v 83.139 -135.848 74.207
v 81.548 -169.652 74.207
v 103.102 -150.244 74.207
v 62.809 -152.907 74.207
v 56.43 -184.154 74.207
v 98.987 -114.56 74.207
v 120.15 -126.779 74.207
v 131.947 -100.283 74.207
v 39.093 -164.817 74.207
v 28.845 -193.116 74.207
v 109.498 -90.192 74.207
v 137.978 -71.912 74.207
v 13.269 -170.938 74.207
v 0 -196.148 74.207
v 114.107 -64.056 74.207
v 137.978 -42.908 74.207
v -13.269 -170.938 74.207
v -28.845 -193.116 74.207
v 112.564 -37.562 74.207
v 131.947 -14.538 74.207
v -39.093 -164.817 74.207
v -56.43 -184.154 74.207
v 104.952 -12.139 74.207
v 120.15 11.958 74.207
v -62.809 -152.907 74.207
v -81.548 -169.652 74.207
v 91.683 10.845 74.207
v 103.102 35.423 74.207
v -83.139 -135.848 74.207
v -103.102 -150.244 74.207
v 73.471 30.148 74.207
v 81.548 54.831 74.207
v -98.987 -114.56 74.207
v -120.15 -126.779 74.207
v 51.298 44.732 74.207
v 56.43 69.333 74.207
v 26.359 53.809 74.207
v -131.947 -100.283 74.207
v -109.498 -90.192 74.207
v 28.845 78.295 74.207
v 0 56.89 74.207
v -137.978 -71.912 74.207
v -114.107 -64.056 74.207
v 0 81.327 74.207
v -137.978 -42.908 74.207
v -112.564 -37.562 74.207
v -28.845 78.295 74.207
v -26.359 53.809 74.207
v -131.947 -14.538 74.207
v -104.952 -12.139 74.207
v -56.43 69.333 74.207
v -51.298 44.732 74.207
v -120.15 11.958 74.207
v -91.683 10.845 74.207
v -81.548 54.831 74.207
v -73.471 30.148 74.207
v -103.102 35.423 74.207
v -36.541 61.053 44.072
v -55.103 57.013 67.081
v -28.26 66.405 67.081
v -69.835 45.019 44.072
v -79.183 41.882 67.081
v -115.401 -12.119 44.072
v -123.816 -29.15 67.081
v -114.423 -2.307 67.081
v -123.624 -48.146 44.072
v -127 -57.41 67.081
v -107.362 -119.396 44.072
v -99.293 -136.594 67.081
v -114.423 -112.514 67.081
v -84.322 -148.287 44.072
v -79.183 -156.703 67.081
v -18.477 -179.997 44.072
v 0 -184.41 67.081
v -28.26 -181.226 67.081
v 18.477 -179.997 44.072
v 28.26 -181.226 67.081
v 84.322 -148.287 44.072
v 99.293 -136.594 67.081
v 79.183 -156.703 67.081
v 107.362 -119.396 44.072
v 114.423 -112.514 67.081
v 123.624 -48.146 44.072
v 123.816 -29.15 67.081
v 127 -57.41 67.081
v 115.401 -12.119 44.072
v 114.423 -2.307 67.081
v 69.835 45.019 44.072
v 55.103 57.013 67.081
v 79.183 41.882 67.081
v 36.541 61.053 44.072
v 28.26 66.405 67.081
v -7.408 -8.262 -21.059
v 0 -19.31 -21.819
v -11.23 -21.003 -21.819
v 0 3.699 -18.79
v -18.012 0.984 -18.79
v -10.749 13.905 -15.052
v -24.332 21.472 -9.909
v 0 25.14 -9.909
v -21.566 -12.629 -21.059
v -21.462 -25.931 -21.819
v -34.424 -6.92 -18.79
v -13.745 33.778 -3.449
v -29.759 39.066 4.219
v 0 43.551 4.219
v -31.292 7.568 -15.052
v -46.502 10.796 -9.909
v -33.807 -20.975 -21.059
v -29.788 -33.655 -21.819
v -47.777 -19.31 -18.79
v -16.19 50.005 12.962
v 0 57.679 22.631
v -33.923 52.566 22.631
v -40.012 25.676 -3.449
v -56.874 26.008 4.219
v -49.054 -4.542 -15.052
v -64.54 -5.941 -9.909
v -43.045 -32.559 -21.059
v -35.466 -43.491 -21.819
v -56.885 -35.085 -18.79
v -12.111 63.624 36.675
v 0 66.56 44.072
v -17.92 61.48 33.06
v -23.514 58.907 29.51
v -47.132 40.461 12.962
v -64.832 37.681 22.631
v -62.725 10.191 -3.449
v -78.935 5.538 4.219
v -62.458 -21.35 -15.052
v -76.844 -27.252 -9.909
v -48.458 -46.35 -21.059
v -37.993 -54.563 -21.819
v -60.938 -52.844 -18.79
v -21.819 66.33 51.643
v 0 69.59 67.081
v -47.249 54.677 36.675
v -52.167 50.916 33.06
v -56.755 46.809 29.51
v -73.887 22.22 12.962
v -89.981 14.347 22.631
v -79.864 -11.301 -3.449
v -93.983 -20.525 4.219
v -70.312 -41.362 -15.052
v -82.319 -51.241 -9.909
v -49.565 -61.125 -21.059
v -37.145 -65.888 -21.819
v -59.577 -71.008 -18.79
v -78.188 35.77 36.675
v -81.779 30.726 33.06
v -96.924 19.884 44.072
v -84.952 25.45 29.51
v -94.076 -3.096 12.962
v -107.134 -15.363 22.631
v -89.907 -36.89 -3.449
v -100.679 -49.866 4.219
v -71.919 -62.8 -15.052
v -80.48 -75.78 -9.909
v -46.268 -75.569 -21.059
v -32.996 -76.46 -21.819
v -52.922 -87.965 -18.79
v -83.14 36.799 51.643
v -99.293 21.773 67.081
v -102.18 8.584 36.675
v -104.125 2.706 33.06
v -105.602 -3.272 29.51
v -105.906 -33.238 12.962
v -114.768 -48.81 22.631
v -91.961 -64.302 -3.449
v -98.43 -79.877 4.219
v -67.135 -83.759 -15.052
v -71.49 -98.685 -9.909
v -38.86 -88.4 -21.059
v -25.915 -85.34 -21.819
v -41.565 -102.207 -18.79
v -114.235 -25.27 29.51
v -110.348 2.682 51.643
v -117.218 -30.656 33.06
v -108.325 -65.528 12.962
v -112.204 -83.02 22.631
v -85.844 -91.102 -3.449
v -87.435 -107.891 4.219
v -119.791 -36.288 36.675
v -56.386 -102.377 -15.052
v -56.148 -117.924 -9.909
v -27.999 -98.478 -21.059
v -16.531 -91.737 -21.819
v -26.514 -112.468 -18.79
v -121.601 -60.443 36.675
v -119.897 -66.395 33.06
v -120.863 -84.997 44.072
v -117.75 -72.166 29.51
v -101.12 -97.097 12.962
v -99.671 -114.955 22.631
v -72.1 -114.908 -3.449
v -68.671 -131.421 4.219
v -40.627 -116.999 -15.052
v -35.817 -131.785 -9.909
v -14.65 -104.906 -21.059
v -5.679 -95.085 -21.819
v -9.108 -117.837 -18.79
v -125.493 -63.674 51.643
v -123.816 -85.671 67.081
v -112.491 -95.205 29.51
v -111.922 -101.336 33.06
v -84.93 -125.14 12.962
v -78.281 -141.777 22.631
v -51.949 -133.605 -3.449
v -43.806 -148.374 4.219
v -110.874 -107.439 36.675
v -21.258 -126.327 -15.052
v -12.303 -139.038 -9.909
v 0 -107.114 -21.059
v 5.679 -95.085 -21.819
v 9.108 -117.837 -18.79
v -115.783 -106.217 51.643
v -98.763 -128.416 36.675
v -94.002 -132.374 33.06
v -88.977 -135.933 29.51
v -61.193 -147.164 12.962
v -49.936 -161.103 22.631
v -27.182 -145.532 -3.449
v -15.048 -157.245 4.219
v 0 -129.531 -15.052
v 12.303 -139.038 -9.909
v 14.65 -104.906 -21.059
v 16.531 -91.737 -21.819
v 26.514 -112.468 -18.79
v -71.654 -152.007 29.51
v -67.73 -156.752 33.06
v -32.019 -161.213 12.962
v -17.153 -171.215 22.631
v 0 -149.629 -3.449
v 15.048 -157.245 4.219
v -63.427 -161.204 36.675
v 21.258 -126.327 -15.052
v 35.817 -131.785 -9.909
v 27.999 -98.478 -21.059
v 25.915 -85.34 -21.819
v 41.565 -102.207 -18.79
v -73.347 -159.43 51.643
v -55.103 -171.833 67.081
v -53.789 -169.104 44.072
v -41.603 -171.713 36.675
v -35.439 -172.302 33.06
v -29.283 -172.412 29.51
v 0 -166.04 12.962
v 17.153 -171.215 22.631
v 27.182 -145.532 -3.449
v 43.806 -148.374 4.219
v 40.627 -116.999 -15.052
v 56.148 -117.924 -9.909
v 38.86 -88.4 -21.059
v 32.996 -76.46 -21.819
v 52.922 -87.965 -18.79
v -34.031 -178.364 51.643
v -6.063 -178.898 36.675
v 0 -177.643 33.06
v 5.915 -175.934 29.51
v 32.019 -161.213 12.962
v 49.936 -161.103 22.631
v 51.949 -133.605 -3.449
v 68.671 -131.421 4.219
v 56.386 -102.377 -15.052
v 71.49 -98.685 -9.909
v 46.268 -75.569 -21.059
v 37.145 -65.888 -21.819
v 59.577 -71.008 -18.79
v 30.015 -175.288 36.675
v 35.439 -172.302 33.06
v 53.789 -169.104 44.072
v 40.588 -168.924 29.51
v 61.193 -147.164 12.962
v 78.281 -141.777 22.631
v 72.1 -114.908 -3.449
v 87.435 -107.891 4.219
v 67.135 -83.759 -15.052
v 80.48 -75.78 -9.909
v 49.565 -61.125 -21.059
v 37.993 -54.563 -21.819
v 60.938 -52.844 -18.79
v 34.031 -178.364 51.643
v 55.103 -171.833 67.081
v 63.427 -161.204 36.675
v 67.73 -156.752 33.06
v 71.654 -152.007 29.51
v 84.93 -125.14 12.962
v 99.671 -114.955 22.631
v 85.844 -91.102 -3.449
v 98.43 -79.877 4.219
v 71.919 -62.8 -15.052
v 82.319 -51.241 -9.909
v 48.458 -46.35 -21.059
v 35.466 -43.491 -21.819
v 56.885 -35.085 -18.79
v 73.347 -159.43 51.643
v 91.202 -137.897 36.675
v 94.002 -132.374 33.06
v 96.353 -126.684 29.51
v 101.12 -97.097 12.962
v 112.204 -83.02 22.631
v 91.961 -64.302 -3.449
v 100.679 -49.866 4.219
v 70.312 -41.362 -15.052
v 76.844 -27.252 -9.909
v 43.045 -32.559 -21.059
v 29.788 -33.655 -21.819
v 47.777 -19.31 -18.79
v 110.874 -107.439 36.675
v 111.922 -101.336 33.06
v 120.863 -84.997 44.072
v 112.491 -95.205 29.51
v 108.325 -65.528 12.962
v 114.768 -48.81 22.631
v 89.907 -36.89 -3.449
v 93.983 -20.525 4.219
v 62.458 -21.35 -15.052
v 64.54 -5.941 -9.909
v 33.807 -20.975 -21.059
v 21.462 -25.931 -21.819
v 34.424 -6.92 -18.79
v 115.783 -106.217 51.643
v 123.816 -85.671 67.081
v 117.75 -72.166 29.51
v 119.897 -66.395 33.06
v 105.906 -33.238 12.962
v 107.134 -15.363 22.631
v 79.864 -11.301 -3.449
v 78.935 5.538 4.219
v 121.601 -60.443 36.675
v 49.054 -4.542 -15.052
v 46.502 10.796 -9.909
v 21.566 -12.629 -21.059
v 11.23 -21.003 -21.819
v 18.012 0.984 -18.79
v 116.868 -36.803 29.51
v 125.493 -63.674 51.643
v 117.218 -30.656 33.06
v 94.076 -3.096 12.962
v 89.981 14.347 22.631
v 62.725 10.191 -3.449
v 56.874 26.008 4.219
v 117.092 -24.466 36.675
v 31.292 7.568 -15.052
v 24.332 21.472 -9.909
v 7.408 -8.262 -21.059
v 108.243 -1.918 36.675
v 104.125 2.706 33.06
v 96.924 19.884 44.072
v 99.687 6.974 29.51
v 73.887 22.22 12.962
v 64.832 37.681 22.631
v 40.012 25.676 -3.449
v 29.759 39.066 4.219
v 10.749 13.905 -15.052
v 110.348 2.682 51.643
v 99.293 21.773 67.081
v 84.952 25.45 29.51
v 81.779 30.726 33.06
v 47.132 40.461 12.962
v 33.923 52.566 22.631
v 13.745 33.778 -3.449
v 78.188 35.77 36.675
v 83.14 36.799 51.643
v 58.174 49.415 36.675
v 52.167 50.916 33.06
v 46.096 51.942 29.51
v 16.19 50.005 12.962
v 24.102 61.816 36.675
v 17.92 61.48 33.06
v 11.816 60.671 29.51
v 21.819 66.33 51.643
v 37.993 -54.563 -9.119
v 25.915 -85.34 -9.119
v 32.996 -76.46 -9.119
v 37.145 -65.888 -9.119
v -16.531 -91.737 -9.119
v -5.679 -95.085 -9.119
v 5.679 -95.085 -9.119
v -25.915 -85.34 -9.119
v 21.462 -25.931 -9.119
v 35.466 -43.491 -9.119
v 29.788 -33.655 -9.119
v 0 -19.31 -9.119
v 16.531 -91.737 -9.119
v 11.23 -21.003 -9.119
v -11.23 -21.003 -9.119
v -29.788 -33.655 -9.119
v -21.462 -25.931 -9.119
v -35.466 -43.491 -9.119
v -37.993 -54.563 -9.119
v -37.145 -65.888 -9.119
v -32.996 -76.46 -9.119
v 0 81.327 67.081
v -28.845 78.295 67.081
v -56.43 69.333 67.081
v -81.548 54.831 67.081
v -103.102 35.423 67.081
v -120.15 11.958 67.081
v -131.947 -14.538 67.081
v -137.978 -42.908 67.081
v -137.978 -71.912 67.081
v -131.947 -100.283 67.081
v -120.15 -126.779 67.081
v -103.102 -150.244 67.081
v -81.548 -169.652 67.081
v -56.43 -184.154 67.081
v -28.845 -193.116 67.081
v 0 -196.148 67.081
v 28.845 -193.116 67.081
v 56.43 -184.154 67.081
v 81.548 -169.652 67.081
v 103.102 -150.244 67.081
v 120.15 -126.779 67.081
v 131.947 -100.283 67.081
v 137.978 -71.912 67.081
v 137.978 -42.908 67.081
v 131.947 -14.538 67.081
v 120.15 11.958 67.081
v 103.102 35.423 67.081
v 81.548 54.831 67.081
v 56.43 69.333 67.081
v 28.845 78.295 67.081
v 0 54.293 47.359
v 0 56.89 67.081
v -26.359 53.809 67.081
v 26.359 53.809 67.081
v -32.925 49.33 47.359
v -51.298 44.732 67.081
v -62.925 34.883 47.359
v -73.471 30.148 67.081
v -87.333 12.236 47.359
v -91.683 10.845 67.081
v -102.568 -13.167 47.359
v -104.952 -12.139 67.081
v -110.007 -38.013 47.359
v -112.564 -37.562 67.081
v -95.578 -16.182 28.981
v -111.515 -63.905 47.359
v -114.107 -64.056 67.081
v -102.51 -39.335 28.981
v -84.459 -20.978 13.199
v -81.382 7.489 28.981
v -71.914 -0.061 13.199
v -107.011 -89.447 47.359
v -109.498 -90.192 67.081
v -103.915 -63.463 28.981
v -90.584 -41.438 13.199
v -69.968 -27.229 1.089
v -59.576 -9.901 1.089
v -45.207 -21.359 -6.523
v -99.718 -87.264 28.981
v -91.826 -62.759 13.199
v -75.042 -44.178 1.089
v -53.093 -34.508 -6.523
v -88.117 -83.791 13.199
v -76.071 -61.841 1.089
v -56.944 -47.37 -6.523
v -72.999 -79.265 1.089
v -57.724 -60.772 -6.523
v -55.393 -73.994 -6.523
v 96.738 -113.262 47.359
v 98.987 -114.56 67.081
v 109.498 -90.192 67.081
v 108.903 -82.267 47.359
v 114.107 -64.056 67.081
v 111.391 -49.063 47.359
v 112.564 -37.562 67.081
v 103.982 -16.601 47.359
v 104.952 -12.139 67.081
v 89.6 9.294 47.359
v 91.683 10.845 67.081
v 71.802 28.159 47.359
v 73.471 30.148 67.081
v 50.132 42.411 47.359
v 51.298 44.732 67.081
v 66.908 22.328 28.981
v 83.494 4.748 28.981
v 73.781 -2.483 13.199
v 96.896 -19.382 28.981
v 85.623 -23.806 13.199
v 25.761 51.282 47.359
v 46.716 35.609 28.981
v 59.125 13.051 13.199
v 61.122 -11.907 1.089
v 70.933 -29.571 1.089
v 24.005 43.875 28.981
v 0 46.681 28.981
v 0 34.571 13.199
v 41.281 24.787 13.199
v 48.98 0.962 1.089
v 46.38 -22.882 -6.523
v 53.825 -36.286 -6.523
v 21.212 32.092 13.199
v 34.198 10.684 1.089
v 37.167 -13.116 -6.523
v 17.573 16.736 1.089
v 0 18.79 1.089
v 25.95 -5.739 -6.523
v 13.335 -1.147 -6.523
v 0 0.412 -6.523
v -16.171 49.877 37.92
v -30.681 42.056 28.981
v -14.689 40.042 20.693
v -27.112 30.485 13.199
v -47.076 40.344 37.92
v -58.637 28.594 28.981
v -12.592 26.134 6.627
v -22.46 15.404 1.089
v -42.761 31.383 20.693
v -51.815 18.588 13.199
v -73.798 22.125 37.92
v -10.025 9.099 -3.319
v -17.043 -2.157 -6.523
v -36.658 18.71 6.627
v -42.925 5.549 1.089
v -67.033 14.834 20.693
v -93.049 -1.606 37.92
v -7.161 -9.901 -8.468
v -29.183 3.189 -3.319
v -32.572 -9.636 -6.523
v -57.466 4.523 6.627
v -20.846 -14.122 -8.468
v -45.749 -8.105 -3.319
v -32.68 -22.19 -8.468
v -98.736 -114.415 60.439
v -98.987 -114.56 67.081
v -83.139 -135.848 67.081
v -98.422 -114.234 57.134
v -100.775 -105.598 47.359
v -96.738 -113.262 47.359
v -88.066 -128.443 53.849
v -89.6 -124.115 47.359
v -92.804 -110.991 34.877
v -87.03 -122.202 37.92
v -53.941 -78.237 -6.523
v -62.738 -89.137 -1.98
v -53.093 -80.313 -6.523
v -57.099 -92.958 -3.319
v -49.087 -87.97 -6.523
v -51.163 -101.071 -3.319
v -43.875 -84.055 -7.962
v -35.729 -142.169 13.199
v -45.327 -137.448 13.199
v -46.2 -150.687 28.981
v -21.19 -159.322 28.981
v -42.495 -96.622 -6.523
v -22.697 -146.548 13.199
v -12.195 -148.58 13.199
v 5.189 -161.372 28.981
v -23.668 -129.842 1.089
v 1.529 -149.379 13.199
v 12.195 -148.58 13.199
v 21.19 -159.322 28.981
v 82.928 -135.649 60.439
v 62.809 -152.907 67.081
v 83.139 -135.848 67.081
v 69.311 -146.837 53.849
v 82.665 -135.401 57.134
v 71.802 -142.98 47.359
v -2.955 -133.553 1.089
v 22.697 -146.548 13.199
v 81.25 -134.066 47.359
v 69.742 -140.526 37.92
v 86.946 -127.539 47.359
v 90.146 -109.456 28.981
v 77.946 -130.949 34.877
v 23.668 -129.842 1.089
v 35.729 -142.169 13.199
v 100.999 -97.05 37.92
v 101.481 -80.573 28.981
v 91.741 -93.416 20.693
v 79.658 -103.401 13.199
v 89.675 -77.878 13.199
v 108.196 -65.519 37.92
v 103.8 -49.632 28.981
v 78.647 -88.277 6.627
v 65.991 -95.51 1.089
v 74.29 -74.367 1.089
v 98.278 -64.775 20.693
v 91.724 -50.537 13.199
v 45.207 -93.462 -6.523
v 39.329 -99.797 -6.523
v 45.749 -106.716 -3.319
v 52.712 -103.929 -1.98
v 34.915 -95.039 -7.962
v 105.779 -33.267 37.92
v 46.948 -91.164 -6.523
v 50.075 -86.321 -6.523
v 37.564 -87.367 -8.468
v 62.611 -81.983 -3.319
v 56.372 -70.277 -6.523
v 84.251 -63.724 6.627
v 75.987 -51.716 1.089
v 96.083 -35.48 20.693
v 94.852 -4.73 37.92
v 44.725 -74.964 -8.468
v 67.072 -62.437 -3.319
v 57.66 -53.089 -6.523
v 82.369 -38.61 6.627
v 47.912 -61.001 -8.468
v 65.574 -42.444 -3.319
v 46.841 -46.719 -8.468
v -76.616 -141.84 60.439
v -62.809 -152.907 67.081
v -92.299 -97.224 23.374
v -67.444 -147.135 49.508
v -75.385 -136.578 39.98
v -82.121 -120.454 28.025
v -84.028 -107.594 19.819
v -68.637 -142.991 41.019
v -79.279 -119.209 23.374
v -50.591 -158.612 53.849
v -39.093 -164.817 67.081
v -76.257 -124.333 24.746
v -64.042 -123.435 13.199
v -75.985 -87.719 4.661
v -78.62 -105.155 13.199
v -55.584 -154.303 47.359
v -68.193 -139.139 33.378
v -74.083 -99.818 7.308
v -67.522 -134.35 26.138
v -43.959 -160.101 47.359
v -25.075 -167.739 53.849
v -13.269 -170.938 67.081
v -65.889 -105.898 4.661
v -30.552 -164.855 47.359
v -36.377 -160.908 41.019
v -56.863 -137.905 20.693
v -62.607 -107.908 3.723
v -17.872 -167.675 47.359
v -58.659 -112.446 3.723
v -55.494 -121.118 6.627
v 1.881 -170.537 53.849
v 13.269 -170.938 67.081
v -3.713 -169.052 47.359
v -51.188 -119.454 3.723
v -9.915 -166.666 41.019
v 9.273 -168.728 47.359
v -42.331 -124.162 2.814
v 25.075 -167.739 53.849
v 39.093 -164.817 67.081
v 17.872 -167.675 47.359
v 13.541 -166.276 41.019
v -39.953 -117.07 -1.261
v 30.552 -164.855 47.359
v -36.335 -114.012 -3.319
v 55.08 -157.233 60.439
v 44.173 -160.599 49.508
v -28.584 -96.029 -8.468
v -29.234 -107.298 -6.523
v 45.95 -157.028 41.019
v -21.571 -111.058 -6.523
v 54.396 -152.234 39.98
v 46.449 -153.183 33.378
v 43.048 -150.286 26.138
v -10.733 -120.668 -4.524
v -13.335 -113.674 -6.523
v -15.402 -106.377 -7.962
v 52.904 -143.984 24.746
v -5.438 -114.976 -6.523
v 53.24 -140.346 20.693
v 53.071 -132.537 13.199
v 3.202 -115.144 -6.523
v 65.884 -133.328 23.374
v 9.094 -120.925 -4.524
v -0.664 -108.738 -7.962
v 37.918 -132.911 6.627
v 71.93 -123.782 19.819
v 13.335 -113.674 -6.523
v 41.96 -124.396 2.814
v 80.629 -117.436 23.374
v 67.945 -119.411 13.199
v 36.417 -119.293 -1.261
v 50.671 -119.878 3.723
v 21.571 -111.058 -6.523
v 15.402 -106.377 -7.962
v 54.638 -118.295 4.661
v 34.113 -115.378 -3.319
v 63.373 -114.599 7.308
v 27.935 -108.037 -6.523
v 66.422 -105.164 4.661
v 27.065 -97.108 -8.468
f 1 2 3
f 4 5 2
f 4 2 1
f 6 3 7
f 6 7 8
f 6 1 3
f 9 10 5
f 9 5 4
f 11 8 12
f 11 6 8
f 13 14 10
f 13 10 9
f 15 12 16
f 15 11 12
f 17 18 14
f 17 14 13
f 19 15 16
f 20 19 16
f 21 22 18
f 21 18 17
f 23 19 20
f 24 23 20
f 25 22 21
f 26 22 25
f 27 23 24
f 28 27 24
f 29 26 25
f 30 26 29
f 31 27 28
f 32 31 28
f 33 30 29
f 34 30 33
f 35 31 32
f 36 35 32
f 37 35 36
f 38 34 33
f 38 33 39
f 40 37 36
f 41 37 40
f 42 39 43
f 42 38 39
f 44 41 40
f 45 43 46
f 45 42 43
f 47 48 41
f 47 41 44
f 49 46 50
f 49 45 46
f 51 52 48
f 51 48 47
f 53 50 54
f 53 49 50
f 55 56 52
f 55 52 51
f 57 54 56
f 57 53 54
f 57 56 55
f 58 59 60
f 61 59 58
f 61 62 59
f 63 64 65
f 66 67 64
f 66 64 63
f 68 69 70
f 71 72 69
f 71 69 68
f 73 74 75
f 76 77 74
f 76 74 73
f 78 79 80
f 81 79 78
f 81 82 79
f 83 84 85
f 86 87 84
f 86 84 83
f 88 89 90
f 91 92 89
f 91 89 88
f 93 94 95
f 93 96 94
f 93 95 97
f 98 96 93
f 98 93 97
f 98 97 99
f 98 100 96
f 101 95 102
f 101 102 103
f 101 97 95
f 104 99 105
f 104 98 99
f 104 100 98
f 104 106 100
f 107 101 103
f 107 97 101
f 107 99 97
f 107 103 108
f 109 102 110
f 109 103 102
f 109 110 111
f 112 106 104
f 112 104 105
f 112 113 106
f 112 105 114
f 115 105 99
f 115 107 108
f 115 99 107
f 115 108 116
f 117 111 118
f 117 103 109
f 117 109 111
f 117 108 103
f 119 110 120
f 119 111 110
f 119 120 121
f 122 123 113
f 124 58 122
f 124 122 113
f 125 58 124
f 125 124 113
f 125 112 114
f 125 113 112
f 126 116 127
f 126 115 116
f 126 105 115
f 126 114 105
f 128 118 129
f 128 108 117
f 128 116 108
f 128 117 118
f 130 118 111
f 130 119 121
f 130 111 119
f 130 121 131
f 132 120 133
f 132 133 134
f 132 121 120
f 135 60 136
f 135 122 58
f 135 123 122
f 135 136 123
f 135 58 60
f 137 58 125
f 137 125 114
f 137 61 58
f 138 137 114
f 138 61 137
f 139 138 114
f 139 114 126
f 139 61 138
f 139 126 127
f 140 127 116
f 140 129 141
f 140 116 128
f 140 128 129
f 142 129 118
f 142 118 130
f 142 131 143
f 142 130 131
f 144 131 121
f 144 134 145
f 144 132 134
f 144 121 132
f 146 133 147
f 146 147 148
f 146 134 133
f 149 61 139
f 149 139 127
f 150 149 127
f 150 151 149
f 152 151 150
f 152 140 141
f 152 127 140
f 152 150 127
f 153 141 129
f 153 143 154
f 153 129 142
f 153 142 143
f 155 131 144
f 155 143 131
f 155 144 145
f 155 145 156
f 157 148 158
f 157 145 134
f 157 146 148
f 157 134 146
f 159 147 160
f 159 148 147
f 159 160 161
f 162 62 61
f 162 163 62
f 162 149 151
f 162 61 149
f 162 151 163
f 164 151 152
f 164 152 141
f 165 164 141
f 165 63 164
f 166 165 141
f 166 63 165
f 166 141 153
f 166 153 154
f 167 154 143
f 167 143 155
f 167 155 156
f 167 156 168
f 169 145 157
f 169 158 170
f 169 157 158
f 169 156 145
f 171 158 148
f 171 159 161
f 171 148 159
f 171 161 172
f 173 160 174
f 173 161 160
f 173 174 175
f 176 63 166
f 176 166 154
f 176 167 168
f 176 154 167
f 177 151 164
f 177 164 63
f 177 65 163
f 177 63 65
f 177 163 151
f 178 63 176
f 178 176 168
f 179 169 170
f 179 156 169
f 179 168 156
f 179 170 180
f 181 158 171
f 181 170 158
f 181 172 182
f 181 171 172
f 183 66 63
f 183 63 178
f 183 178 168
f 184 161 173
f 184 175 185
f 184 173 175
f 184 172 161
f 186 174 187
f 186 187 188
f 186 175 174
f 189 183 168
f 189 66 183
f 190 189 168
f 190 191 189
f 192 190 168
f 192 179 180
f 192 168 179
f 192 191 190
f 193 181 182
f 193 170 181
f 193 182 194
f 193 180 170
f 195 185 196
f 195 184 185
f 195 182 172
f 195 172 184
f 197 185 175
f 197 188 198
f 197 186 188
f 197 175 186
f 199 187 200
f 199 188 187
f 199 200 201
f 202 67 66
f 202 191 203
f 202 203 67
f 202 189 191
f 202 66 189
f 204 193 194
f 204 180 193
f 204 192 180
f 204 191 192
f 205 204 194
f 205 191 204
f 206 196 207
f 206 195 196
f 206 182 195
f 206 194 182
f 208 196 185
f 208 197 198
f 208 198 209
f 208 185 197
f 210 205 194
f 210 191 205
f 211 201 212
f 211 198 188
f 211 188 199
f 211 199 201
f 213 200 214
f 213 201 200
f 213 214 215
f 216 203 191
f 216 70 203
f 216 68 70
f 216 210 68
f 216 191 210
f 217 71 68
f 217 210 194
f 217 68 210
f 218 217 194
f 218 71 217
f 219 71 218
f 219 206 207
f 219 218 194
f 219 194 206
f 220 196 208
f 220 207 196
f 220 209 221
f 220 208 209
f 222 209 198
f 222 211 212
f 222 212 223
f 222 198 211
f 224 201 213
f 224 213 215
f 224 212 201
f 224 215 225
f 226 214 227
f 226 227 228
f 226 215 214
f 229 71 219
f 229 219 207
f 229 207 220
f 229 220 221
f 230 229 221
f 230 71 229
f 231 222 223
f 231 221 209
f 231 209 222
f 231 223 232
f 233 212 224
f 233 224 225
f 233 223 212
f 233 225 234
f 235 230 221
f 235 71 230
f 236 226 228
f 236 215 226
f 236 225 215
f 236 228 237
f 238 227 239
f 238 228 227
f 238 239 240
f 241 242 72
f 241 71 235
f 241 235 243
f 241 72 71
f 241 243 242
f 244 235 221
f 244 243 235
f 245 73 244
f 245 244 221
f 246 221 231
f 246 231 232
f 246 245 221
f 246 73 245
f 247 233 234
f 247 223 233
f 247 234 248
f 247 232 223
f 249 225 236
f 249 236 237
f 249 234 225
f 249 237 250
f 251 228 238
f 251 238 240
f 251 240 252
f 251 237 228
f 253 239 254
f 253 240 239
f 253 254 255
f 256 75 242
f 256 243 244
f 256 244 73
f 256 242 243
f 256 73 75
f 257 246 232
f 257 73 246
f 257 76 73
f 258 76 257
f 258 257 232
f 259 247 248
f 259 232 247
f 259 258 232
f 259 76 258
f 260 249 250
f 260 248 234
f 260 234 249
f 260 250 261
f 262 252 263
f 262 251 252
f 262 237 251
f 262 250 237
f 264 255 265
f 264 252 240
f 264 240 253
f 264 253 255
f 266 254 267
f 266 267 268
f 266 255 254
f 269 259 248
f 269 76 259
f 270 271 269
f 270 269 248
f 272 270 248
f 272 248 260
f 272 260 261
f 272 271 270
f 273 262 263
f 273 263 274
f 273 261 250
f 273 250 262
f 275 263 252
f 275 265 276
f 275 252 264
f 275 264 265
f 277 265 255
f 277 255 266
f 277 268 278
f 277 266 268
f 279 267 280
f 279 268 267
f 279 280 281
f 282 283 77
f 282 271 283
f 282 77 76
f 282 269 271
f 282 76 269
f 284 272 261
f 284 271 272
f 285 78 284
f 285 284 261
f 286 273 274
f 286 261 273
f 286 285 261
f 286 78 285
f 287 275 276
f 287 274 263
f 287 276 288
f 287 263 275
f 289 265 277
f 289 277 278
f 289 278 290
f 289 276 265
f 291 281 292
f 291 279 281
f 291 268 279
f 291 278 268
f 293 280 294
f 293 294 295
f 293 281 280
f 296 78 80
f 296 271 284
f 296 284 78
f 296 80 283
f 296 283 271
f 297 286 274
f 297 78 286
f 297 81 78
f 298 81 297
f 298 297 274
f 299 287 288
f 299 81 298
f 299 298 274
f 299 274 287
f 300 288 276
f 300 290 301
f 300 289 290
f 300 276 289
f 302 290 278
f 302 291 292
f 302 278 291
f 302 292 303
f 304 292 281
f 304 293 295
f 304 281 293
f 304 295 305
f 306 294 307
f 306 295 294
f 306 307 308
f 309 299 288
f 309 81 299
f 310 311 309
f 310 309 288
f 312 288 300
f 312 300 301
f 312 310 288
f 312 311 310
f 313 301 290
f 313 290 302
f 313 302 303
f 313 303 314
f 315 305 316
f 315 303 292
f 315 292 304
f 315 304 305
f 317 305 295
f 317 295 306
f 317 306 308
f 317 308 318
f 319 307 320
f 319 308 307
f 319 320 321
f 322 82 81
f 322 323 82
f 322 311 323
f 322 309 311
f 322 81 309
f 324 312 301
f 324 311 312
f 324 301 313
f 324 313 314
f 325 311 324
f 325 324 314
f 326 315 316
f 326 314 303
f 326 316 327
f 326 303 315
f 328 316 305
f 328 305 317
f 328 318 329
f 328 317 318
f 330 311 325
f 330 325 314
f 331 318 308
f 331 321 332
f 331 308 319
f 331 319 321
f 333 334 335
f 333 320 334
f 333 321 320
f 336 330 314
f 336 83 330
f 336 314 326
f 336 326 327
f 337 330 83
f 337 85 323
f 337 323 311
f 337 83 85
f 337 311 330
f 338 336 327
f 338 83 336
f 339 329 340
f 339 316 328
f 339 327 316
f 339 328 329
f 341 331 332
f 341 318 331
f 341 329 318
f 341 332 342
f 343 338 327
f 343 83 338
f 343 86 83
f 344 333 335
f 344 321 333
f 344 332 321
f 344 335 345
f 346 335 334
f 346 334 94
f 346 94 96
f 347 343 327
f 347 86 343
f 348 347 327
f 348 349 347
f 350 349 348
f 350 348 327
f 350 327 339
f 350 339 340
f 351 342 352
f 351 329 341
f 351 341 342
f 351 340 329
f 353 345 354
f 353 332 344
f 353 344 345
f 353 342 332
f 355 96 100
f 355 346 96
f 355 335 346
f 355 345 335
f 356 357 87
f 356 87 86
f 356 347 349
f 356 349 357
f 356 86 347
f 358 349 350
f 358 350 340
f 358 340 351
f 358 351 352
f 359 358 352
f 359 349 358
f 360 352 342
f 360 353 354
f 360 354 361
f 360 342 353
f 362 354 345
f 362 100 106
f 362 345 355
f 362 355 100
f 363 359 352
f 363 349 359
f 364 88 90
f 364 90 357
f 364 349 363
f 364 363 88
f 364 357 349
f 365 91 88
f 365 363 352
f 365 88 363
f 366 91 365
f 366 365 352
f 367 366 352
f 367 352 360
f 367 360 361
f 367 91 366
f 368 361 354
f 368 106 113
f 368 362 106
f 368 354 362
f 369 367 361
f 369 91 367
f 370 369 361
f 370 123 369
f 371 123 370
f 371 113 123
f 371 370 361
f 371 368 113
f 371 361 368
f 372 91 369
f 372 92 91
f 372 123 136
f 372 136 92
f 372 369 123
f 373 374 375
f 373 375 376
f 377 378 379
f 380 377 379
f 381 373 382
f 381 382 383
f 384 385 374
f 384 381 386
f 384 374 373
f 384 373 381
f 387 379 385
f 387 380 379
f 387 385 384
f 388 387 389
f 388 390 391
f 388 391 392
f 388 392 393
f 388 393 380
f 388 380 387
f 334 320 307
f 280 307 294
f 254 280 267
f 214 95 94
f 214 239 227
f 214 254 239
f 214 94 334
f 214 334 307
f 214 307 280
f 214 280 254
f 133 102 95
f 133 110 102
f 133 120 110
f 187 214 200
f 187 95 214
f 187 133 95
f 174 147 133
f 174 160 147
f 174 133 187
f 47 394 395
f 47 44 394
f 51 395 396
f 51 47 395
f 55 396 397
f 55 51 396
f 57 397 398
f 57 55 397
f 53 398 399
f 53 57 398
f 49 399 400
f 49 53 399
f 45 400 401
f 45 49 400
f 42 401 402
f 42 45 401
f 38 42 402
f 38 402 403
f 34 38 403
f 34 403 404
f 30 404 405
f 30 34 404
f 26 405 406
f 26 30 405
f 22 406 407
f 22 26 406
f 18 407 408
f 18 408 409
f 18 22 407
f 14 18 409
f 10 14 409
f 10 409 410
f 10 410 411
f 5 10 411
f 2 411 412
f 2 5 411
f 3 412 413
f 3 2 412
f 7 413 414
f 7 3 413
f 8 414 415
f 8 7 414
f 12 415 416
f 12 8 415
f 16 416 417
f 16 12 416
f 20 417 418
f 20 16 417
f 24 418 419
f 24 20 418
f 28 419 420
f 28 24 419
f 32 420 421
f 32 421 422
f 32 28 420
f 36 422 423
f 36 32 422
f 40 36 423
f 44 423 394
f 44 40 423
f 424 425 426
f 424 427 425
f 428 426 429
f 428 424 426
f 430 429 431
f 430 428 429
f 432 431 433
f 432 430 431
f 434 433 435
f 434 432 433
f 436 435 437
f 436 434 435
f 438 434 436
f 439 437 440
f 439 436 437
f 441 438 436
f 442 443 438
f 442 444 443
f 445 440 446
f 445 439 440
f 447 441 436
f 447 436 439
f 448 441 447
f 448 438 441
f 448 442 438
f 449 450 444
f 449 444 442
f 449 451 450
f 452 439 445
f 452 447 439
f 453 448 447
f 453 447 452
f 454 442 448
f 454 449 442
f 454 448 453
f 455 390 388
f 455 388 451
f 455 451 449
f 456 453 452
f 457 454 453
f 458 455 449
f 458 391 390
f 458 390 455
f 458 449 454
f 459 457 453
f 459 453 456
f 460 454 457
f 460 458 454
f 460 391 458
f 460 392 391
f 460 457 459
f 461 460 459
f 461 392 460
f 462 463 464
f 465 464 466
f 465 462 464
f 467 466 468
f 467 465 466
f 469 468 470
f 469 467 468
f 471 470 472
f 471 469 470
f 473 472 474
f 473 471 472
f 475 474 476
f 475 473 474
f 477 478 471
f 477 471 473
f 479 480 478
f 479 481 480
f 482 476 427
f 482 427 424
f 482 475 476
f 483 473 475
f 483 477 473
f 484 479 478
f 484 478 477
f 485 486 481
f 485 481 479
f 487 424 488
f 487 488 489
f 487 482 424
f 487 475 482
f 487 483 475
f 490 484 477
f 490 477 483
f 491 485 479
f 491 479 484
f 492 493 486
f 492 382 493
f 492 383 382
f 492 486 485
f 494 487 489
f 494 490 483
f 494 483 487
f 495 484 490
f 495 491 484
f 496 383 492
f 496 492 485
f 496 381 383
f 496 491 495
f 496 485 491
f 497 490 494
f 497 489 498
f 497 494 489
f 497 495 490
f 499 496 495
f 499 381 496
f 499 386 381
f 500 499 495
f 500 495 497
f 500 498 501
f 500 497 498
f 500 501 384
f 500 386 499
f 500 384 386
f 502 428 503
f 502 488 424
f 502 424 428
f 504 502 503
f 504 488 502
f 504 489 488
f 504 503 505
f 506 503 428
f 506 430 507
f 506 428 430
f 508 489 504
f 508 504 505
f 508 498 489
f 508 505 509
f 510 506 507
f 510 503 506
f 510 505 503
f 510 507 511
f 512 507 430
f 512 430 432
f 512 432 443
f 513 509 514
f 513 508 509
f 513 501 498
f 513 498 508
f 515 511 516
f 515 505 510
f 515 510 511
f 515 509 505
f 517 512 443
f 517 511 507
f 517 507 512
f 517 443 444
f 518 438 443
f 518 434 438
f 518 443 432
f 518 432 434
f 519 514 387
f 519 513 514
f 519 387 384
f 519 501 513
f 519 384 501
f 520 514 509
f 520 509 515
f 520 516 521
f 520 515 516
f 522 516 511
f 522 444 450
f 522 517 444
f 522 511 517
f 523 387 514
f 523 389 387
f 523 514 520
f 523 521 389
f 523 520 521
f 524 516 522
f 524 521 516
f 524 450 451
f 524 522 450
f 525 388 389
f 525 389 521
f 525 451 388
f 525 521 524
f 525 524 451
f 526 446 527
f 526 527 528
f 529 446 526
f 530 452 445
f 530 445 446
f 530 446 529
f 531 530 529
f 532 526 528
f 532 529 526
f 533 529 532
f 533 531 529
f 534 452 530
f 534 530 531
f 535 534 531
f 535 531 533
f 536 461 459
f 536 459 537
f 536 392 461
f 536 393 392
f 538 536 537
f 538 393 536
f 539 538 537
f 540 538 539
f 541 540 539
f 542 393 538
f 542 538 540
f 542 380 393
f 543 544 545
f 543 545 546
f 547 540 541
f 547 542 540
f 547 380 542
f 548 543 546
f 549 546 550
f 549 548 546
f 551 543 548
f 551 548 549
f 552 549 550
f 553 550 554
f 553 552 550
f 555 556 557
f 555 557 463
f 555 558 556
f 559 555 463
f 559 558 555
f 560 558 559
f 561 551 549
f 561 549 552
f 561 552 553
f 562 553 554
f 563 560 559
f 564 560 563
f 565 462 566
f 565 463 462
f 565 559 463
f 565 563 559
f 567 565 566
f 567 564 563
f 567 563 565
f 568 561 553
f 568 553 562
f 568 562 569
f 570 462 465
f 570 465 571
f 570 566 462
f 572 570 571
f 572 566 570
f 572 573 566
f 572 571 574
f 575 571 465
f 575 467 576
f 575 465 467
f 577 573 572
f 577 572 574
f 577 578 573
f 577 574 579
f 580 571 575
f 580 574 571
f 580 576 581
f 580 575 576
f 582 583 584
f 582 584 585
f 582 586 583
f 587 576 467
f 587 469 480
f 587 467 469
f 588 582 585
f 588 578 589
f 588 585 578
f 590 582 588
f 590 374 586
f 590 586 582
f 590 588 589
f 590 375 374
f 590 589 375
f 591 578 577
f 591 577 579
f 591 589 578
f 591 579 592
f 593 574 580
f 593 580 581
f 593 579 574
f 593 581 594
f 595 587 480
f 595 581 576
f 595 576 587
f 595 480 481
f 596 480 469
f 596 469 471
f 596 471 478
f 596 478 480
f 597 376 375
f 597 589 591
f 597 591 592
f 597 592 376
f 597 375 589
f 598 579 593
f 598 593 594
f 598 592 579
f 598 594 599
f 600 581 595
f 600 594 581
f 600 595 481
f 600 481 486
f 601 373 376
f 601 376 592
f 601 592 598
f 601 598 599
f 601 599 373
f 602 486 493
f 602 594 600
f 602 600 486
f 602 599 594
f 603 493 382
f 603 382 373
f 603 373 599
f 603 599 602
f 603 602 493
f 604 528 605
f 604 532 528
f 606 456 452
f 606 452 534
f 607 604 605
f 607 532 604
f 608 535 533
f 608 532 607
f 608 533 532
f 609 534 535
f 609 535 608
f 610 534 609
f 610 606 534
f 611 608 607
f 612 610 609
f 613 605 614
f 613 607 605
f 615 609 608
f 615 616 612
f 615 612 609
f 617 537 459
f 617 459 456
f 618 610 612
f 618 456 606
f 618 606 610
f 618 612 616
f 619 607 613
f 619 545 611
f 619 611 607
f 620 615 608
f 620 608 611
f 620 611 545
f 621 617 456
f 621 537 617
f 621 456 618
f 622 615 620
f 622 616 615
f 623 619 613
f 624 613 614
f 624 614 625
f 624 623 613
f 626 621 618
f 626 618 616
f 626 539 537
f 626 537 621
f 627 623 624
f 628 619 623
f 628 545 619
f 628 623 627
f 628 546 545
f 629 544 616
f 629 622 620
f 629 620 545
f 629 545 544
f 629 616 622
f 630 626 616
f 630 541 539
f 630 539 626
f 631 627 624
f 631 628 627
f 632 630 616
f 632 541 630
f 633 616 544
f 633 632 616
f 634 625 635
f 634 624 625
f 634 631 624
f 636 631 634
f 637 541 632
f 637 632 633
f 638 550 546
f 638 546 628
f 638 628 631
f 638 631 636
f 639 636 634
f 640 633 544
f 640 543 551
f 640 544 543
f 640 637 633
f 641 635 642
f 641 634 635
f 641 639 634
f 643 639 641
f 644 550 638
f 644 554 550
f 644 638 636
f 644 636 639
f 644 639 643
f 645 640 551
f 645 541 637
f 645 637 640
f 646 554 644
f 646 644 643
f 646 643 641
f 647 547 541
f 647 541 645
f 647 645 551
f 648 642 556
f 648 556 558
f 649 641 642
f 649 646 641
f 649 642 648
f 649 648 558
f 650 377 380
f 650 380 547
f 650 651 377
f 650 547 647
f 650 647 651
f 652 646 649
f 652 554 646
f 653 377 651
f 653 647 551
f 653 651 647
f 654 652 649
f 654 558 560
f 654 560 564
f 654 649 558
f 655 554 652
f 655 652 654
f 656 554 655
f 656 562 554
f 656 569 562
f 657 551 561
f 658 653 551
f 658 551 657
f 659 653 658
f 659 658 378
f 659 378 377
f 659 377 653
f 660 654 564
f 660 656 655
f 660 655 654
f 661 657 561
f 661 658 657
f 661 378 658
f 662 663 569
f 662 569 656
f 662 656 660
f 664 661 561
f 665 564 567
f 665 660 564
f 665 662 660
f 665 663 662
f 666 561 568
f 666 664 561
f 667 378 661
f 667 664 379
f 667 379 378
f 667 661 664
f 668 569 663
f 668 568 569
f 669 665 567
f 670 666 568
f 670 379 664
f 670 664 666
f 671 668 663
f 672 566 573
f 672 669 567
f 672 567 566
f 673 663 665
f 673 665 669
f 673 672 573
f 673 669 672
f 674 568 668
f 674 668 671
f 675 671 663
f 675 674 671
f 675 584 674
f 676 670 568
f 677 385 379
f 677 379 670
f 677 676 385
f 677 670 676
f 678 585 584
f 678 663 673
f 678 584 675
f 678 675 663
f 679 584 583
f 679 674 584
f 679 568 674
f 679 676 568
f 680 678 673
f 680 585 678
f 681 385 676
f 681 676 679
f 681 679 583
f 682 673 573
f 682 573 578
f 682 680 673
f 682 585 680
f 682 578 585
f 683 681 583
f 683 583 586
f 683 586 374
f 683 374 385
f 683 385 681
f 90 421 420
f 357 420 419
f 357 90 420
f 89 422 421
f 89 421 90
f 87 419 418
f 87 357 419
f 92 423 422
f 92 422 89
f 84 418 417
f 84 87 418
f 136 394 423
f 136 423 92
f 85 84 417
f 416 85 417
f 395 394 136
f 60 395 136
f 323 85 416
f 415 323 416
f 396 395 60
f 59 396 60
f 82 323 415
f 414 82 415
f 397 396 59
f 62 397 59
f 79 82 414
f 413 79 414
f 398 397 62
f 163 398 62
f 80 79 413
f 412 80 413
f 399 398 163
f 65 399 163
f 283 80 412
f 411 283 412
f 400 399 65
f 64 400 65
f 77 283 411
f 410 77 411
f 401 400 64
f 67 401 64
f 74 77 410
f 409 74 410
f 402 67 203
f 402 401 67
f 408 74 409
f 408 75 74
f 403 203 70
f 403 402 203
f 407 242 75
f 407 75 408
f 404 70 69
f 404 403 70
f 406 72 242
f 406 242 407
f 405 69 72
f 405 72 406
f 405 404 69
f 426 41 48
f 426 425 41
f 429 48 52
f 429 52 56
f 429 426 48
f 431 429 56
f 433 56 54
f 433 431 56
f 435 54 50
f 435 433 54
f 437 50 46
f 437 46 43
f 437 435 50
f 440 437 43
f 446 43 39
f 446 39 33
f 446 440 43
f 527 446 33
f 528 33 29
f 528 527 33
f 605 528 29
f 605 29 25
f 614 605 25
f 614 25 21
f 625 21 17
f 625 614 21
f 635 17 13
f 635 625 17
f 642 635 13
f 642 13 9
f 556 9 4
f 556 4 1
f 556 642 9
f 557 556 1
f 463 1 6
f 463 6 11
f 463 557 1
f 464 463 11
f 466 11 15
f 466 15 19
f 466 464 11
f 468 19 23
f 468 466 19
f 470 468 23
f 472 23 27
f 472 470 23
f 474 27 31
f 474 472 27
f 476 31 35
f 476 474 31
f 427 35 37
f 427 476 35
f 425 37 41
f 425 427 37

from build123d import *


with BuildPart() as f1:
    # F0 (on Right) → F1 (revolve)
    with BuildSketch(Plane.YZ):
        with BuildLine():
            Line((-19.310446, -9.119444), (-57.410446, -9.119444))
            Line((-57.410446, -9.119444), (-57.410446, -21.819444))
            Line((-57.410446, -21.819444), (-19.310446, -21.819444))
            ThreePointArc((-19.310446, -21.819444), (43.551347, 4.218764), (69.589554, 67.080556))
            Line((69.589554, 67.080556), (81.327197, 67.080556))
            Line((81.327197, 67.080556), (81.327197, 74.207493))
            Line((81.327197, 74.207493), (56.889554, 74.207493))
            Line((56.889554, 74.207493), (56.889554, 67.080556))
            ThreePointArc((56.889554, 67.080556), (34.571091, 13.19902), (-19.310446, -9.119444))
        make_face()
    revolve(axis=Axis((0, -57.410446, 37.590552), (0, 0, 1)))


solid = f1.part
